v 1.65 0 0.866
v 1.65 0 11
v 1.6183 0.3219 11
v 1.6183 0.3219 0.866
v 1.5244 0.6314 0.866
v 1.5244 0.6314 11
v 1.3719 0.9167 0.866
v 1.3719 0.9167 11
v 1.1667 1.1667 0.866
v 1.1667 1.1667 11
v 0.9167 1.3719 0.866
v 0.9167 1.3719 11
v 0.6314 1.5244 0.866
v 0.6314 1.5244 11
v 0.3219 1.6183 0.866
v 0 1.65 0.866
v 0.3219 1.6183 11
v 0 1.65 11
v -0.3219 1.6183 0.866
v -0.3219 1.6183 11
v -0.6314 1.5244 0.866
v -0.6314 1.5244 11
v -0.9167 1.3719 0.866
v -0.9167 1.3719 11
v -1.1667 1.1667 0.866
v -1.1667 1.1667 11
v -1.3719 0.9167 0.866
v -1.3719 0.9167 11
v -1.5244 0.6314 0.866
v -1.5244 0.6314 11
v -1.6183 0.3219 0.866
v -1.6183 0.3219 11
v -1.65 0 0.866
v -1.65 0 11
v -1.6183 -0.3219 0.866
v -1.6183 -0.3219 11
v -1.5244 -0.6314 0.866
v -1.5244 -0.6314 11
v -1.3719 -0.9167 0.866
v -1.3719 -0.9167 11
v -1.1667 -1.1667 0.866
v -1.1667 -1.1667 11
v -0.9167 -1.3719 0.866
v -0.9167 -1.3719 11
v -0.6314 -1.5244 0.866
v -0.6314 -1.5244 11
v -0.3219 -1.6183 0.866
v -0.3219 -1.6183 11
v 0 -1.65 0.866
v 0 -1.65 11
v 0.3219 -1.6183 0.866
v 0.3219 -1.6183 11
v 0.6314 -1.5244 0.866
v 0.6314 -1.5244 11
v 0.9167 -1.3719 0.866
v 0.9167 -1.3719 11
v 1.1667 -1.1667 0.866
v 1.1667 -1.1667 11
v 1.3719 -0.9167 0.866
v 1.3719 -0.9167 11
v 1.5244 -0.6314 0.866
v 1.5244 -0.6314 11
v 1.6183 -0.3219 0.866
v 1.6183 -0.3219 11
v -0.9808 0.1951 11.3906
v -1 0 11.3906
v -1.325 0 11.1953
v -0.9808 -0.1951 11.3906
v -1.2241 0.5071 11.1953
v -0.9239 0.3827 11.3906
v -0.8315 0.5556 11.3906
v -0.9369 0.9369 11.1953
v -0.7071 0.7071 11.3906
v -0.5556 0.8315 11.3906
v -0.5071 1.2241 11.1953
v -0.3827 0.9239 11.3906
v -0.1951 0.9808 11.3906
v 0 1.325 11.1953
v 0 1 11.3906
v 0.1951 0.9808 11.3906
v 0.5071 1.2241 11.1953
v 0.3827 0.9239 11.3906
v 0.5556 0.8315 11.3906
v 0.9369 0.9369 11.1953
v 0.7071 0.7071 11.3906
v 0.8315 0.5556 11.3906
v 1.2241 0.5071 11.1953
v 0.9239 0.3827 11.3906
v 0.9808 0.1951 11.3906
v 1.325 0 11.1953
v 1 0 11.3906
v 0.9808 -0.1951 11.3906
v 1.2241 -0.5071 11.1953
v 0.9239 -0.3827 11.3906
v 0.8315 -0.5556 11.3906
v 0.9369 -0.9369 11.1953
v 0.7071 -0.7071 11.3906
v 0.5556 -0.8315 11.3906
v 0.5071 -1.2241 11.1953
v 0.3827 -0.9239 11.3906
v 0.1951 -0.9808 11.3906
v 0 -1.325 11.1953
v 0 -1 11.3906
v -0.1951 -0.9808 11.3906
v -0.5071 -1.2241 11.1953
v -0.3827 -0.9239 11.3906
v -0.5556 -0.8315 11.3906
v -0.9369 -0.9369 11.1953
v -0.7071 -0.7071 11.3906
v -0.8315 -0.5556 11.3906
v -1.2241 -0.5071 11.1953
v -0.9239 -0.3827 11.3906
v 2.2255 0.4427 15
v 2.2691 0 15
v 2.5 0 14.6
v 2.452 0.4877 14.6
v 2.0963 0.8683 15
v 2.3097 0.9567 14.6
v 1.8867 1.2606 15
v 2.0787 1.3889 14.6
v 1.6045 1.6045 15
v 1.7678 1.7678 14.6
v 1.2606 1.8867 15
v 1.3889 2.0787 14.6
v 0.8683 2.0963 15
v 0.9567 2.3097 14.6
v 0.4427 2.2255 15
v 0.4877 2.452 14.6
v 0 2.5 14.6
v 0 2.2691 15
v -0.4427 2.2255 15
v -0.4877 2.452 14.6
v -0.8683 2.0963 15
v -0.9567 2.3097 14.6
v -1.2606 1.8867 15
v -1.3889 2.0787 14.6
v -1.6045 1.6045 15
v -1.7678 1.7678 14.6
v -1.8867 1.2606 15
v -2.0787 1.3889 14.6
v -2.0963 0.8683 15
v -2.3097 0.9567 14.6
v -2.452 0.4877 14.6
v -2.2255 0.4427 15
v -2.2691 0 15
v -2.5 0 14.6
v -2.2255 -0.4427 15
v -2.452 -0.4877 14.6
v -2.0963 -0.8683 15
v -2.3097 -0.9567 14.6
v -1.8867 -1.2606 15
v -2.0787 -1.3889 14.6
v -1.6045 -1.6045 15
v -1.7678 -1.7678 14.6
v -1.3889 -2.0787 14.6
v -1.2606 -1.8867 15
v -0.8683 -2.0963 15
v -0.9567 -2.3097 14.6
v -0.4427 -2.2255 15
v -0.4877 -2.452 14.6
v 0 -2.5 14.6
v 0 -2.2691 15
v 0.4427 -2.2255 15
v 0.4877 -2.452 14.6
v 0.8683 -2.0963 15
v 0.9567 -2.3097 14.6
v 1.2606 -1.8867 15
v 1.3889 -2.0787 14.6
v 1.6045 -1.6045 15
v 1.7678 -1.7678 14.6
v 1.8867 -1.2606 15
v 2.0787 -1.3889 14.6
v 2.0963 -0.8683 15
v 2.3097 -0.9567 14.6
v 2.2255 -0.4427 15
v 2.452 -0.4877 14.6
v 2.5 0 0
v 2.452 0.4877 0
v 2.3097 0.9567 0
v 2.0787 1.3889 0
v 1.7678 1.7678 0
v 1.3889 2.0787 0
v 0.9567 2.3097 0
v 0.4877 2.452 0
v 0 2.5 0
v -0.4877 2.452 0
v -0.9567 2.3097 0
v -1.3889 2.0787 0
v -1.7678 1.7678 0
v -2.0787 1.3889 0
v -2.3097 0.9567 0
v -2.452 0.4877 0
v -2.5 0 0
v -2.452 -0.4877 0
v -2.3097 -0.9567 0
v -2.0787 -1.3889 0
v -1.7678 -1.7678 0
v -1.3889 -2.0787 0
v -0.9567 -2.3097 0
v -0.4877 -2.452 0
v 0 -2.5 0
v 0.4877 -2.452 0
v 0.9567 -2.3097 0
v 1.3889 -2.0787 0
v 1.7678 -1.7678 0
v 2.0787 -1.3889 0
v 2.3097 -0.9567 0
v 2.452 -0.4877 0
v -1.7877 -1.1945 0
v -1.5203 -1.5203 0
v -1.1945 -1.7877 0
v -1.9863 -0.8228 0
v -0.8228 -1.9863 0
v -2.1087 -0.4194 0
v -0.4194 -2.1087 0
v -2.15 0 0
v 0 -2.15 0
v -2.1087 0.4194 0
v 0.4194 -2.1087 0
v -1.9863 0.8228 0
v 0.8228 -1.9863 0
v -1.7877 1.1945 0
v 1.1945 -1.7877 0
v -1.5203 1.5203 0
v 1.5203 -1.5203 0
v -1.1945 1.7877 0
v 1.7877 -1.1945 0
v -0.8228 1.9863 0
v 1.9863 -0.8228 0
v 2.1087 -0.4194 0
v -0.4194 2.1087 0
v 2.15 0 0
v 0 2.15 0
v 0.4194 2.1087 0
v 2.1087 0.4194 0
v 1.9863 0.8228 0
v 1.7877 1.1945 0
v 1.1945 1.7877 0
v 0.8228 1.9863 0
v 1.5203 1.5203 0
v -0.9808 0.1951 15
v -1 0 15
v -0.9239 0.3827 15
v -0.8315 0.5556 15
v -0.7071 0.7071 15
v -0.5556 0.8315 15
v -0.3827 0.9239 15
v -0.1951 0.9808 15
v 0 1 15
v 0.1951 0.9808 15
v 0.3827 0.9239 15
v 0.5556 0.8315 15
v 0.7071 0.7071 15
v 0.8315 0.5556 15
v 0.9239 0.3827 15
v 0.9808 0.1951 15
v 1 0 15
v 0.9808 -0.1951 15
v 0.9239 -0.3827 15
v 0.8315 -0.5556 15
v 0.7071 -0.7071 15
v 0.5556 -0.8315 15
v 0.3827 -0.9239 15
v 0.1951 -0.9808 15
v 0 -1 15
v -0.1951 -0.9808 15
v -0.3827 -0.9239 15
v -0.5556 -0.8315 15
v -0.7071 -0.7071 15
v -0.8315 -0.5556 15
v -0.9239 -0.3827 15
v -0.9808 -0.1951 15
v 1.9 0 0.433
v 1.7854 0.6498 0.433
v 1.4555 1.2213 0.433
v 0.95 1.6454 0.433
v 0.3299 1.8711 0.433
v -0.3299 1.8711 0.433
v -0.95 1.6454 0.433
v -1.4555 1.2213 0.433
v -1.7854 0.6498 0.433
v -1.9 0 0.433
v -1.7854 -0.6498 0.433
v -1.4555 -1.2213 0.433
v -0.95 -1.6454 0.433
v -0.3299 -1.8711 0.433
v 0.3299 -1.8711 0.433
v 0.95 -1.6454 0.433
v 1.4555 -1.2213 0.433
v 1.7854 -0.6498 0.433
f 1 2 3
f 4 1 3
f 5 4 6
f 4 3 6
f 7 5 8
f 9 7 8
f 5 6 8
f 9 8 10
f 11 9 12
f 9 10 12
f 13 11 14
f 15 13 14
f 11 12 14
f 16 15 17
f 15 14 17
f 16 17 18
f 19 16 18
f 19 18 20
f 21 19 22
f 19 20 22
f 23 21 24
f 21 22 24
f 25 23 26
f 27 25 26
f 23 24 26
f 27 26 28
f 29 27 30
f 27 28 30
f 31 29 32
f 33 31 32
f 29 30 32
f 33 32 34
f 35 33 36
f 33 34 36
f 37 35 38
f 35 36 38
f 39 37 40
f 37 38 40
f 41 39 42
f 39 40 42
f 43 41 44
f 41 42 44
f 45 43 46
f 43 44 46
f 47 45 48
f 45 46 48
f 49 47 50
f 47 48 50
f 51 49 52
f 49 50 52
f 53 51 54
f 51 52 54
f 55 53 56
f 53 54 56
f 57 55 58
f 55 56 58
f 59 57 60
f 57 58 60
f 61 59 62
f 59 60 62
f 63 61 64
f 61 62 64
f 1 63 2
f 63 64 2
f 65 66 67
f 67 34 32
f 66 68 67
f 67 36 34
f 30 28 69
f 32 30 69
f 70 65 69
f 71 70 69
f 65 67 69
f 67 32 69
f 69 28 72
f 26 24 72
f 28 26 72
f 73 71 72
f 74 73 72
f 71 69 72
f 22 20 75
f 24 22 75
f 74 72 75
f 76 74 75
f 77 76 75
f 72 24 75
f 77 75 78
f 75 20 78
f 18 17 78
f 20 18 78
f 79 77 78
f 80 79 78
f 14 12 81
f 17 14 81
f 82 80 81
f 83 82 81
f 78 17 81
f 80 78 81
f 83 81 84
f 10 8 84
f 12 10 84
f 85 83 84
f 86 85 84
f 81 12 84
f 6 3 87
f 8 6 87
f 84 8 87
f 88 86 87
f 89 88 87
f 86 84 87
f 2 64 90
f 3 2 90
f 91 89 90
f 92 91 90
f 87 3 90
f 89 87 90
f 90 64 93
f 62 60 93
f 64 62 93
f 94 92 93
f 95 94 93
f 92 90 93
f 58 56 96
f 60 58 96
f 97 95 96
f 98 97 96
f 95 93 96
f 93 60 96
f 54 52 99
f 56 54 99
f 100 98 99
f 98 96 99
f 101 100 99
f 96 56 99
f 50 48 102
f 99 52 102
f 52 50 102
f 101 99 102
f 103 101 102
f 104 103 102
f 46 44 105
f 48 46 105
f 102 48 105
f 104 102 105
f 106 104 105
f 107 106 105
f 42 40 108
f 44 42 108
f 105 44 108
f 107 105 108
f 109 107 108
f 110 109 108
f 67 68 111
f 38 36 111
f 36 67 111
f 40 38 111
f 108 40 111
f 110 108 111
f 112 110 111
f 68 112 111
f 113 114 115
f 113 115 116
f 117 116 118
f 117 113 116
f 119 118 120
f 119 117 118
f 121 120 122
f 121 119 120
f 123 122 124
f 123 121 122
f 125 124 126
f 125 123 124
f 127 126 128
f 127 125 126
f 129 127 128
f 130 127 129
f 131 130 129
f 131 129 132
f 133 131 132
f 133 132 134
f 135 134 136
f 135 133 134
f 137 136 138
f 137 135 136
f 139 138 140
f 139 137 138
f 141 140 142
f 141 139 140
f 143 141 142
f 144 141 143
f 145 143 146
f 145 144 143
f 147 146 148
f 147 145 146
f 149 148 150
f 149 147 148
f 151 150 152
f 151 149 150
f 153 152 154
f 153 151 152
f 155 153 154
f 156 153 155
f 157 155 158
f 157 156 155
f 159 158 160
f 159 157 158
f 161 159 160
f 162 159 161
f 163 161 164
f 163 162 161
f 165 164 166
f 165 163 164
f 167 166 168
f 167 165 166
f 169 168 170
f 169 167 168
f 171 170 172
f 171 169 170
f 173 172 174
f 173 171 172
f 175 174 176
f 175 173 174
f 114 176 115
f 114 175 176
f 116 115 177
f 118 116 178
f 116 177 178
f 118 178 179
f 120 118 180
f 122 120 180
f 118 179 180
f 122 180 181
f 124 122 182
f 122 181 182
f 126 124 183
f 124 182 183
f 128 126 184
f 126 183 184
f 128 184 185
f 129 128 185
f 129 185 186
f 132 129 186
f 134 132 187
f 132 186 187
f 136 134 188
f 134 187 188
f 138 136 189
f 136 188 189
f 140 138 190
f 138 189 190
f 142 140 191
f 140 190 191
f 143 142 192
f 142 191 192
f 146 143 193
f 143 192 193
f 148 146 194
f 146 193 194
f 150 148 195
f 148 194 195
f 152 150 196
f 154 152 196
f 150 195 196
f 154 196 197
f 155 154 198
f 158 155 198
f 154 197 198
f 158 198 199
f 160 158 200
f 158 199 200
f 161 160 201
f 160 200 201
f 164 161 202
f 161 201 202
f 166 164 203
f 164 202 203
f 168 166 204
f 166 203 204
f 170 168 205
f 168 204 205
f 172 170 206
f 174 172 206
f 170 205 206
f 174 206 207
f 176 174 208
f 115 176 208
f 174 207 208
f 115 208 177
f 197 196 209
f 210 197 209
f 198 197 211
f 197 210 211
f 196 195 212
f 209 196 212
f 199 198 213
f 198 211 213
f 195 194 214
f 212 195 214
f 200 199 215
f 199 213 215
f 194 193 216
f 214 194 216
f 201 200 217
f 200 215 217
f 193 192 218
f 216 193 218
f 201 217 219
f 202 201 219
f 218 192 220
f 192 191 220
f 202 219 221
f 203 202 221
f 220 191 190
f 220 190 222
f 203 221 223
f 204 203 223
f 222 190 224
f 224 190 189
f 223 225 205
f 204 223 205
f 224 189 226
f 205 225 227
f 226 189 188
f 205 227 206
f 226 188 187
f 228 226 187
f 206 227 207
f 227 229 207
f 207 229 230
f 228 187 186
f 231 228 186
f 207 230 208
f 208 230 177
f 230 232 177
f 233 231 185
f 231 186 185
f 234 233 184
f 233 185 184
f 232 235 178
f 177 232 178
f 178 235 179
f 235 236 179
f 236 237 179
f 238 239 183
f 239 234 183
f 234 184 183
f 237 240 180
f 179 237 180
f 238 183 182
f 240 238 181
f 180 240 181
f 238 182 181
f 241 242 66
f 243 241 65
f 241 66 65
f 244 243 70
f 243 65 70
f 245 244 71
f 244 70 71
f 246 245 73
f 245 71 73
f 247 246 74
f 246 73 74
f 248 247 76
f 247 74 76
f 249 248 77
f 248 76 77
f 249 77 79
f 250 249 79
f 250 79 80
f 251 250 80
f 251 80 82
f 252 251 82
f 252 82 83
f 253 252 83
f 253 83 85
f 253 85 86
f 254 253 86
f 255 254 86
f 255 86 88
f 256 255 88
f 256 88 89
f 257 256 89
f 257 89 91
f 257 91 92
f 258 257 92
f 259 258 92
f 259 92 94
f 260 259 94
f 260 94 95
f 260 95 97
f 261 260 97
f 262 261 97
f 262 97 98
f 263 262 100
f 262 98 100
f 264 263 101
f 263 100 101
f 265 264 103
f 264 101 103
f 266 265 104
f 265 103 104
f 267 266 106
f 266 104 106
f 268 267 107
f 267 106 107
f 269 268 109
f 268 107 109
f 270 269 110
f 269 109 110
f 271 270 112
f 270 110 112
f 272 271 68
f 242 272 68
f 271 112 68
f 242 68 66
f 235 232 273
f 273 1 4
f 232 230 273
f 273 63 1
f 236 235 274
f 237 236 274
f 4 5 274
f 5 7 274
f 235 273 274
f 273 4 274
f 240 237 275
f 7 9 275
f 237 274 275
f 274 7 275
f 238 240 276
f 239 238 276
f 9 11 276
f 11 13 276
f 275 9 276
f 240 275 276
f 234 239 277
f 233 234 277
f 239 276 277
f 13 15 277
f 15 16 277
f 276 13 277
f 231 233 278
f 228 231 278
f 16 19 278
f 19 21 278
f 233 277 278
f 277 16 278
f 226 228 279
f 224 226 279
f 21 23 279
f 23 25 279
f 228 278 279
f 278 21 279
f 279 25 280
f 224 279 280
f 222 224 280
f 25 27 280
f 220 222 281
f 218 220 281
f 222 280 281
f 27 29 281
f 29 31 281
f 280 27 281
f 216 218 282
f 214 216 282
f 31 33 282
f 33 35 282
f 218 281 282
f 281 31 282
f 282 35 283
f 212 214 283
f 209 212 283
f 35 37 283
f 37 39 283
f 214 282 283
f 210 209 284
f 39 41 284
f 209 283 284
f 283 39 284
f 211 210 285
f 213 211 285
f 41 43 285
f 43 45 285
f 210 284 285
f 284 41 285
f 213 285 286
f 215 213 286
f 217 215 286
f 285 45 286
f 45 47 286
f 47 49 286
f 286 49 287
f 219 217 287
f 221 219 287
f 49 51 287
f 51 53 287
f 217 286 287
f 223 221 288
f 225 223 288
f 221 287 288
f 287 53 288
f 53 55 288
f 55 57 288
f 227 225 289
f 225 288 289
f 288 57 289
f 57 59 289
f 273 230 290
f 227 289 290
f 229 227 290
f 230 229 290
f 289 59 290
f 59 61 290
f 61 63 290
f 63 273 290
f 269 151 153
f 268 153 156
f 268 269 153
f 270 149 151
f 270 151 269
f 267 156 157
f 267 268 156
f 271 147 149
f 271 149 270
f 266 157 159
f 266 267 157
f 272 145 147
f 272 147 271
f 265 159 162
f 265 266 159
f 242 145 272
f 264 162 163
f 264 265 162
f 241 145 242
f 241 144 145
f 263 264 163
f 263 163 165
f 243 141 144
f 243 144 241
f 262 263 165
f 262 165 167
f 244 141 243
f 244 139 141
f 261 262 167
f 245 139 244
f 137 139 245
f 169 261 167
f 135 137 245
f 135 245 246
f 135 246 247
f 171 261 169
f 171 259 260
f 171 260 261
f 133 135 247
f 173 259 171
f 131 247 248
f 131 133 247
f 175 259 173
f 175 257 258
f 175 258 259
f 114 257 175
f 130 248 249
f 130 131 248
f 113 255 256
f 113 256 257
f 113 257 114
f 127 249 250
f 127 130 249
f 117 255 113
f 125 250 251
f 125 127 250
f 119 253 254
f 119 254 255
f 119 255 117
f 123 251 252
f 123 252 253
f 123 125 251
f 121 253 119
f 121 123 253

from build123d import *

# Parameters (mm, degrees)
SKETCH1_R                       = 2.5
BOSS_EXTRUDE1_DEPTH             = 15
SKETCH2_R                       = 1
CUT_EXTRUDE1_DEPTH              = 16.411035007
TAP_DRILL_FOR_M4X0_7_TAP1_D     = 3.3
TAP_DRILL_FOR_M4X0_7_TAP1_DEPTH = 11
TAP_DRILL_FOR_M4X0_7_TAP1_TIP   = 0.991420021
CHAMFER1_SIZE                   = 0.4
CHAMFER1_SIZE2                  = 0.230940108
CHAMFER2_SIZE                   = 0.5
CHAMFER2_SIZE2                  = 0.866025404


with BuildPart() as part:
    # Sketch1 → Boss-Extrude1 (new body)
    with BuildSketch(Plane.XY):
        Circle(SKETCH1_R)
    extrude(amount=BOSS_EXTRUDE1_DEPTH)

    # Sketch2 → Cut-Extrude1 (cut, through all)
    with BuildSketch(Plane(origin=(0, 0, 0), x_dir=(-1, 0, 0), z_dir=(0, 0, -1))):
        Circle(SKETCH2_R)
    extrude(amount=-CUT_EXTRUDE1_DEPTH, mode=Mode.SUBTRACT)

    # Tap Drill for M4x0.7 Tap1
    with Locations(Plane(origin=(0, 0, 0), x_dir=(-1, 0, 0), z_dir=(0, 0, -1))):
        with Locations((0, 0)):
            Hole(TAP_DRILL_FOR_M4X0_7_TAP1_D / 2, depth=TAP_DRILL_FOR_M4X0_7_TAP1_DEPTH)
            with Locations((0, 0, -(TAP_DRILL_FOR_M4X0_7_TAP1_DEPTH + TAP_DRILL_FOR_M4X0_7_TAP1_TIP / 2))):  # 118° drill point
                Cone(0, TAP_DRILL_FOR_M4X0_7_TAP1_D / 2, TAP_DRILL_FOR_M4X0_7_TAP1_TIP, mode=Mode.SUBTRACT)

    # Chamfer1
    chamfer1_edges = [part.edges().sort_by_distance(p)[0] for p in [
        (-2.5, 0, 15),
    ]]
    chamfer1_side = [part.faces().sort_by_distance(p)[0] for p in [
        (-2.5, 0, 7.5),
    ]]
    chamfer(chamfer1_edges, length=CHAMFER1_SIZE, length2=CHAMFER1_SIZE2, reference=chamfer1_side[0])

    # Chamfer2
    chamfer2_edges = [part.edges().sort_by_distance(p)[0] for p in [
        (-1.65, 0, 0),
    ]]
    chamfer2_side = [part.faces().sort_by_distance(p)[0] for p in [
        (-2.429289322, 0, 0),
    ]]
    chamfer(chamfer2_edges, length=CHAMFER2_SIZE, length2=CHAMFER2_SIZE2, reference=chamfer2_side[0])


solid = part.part
